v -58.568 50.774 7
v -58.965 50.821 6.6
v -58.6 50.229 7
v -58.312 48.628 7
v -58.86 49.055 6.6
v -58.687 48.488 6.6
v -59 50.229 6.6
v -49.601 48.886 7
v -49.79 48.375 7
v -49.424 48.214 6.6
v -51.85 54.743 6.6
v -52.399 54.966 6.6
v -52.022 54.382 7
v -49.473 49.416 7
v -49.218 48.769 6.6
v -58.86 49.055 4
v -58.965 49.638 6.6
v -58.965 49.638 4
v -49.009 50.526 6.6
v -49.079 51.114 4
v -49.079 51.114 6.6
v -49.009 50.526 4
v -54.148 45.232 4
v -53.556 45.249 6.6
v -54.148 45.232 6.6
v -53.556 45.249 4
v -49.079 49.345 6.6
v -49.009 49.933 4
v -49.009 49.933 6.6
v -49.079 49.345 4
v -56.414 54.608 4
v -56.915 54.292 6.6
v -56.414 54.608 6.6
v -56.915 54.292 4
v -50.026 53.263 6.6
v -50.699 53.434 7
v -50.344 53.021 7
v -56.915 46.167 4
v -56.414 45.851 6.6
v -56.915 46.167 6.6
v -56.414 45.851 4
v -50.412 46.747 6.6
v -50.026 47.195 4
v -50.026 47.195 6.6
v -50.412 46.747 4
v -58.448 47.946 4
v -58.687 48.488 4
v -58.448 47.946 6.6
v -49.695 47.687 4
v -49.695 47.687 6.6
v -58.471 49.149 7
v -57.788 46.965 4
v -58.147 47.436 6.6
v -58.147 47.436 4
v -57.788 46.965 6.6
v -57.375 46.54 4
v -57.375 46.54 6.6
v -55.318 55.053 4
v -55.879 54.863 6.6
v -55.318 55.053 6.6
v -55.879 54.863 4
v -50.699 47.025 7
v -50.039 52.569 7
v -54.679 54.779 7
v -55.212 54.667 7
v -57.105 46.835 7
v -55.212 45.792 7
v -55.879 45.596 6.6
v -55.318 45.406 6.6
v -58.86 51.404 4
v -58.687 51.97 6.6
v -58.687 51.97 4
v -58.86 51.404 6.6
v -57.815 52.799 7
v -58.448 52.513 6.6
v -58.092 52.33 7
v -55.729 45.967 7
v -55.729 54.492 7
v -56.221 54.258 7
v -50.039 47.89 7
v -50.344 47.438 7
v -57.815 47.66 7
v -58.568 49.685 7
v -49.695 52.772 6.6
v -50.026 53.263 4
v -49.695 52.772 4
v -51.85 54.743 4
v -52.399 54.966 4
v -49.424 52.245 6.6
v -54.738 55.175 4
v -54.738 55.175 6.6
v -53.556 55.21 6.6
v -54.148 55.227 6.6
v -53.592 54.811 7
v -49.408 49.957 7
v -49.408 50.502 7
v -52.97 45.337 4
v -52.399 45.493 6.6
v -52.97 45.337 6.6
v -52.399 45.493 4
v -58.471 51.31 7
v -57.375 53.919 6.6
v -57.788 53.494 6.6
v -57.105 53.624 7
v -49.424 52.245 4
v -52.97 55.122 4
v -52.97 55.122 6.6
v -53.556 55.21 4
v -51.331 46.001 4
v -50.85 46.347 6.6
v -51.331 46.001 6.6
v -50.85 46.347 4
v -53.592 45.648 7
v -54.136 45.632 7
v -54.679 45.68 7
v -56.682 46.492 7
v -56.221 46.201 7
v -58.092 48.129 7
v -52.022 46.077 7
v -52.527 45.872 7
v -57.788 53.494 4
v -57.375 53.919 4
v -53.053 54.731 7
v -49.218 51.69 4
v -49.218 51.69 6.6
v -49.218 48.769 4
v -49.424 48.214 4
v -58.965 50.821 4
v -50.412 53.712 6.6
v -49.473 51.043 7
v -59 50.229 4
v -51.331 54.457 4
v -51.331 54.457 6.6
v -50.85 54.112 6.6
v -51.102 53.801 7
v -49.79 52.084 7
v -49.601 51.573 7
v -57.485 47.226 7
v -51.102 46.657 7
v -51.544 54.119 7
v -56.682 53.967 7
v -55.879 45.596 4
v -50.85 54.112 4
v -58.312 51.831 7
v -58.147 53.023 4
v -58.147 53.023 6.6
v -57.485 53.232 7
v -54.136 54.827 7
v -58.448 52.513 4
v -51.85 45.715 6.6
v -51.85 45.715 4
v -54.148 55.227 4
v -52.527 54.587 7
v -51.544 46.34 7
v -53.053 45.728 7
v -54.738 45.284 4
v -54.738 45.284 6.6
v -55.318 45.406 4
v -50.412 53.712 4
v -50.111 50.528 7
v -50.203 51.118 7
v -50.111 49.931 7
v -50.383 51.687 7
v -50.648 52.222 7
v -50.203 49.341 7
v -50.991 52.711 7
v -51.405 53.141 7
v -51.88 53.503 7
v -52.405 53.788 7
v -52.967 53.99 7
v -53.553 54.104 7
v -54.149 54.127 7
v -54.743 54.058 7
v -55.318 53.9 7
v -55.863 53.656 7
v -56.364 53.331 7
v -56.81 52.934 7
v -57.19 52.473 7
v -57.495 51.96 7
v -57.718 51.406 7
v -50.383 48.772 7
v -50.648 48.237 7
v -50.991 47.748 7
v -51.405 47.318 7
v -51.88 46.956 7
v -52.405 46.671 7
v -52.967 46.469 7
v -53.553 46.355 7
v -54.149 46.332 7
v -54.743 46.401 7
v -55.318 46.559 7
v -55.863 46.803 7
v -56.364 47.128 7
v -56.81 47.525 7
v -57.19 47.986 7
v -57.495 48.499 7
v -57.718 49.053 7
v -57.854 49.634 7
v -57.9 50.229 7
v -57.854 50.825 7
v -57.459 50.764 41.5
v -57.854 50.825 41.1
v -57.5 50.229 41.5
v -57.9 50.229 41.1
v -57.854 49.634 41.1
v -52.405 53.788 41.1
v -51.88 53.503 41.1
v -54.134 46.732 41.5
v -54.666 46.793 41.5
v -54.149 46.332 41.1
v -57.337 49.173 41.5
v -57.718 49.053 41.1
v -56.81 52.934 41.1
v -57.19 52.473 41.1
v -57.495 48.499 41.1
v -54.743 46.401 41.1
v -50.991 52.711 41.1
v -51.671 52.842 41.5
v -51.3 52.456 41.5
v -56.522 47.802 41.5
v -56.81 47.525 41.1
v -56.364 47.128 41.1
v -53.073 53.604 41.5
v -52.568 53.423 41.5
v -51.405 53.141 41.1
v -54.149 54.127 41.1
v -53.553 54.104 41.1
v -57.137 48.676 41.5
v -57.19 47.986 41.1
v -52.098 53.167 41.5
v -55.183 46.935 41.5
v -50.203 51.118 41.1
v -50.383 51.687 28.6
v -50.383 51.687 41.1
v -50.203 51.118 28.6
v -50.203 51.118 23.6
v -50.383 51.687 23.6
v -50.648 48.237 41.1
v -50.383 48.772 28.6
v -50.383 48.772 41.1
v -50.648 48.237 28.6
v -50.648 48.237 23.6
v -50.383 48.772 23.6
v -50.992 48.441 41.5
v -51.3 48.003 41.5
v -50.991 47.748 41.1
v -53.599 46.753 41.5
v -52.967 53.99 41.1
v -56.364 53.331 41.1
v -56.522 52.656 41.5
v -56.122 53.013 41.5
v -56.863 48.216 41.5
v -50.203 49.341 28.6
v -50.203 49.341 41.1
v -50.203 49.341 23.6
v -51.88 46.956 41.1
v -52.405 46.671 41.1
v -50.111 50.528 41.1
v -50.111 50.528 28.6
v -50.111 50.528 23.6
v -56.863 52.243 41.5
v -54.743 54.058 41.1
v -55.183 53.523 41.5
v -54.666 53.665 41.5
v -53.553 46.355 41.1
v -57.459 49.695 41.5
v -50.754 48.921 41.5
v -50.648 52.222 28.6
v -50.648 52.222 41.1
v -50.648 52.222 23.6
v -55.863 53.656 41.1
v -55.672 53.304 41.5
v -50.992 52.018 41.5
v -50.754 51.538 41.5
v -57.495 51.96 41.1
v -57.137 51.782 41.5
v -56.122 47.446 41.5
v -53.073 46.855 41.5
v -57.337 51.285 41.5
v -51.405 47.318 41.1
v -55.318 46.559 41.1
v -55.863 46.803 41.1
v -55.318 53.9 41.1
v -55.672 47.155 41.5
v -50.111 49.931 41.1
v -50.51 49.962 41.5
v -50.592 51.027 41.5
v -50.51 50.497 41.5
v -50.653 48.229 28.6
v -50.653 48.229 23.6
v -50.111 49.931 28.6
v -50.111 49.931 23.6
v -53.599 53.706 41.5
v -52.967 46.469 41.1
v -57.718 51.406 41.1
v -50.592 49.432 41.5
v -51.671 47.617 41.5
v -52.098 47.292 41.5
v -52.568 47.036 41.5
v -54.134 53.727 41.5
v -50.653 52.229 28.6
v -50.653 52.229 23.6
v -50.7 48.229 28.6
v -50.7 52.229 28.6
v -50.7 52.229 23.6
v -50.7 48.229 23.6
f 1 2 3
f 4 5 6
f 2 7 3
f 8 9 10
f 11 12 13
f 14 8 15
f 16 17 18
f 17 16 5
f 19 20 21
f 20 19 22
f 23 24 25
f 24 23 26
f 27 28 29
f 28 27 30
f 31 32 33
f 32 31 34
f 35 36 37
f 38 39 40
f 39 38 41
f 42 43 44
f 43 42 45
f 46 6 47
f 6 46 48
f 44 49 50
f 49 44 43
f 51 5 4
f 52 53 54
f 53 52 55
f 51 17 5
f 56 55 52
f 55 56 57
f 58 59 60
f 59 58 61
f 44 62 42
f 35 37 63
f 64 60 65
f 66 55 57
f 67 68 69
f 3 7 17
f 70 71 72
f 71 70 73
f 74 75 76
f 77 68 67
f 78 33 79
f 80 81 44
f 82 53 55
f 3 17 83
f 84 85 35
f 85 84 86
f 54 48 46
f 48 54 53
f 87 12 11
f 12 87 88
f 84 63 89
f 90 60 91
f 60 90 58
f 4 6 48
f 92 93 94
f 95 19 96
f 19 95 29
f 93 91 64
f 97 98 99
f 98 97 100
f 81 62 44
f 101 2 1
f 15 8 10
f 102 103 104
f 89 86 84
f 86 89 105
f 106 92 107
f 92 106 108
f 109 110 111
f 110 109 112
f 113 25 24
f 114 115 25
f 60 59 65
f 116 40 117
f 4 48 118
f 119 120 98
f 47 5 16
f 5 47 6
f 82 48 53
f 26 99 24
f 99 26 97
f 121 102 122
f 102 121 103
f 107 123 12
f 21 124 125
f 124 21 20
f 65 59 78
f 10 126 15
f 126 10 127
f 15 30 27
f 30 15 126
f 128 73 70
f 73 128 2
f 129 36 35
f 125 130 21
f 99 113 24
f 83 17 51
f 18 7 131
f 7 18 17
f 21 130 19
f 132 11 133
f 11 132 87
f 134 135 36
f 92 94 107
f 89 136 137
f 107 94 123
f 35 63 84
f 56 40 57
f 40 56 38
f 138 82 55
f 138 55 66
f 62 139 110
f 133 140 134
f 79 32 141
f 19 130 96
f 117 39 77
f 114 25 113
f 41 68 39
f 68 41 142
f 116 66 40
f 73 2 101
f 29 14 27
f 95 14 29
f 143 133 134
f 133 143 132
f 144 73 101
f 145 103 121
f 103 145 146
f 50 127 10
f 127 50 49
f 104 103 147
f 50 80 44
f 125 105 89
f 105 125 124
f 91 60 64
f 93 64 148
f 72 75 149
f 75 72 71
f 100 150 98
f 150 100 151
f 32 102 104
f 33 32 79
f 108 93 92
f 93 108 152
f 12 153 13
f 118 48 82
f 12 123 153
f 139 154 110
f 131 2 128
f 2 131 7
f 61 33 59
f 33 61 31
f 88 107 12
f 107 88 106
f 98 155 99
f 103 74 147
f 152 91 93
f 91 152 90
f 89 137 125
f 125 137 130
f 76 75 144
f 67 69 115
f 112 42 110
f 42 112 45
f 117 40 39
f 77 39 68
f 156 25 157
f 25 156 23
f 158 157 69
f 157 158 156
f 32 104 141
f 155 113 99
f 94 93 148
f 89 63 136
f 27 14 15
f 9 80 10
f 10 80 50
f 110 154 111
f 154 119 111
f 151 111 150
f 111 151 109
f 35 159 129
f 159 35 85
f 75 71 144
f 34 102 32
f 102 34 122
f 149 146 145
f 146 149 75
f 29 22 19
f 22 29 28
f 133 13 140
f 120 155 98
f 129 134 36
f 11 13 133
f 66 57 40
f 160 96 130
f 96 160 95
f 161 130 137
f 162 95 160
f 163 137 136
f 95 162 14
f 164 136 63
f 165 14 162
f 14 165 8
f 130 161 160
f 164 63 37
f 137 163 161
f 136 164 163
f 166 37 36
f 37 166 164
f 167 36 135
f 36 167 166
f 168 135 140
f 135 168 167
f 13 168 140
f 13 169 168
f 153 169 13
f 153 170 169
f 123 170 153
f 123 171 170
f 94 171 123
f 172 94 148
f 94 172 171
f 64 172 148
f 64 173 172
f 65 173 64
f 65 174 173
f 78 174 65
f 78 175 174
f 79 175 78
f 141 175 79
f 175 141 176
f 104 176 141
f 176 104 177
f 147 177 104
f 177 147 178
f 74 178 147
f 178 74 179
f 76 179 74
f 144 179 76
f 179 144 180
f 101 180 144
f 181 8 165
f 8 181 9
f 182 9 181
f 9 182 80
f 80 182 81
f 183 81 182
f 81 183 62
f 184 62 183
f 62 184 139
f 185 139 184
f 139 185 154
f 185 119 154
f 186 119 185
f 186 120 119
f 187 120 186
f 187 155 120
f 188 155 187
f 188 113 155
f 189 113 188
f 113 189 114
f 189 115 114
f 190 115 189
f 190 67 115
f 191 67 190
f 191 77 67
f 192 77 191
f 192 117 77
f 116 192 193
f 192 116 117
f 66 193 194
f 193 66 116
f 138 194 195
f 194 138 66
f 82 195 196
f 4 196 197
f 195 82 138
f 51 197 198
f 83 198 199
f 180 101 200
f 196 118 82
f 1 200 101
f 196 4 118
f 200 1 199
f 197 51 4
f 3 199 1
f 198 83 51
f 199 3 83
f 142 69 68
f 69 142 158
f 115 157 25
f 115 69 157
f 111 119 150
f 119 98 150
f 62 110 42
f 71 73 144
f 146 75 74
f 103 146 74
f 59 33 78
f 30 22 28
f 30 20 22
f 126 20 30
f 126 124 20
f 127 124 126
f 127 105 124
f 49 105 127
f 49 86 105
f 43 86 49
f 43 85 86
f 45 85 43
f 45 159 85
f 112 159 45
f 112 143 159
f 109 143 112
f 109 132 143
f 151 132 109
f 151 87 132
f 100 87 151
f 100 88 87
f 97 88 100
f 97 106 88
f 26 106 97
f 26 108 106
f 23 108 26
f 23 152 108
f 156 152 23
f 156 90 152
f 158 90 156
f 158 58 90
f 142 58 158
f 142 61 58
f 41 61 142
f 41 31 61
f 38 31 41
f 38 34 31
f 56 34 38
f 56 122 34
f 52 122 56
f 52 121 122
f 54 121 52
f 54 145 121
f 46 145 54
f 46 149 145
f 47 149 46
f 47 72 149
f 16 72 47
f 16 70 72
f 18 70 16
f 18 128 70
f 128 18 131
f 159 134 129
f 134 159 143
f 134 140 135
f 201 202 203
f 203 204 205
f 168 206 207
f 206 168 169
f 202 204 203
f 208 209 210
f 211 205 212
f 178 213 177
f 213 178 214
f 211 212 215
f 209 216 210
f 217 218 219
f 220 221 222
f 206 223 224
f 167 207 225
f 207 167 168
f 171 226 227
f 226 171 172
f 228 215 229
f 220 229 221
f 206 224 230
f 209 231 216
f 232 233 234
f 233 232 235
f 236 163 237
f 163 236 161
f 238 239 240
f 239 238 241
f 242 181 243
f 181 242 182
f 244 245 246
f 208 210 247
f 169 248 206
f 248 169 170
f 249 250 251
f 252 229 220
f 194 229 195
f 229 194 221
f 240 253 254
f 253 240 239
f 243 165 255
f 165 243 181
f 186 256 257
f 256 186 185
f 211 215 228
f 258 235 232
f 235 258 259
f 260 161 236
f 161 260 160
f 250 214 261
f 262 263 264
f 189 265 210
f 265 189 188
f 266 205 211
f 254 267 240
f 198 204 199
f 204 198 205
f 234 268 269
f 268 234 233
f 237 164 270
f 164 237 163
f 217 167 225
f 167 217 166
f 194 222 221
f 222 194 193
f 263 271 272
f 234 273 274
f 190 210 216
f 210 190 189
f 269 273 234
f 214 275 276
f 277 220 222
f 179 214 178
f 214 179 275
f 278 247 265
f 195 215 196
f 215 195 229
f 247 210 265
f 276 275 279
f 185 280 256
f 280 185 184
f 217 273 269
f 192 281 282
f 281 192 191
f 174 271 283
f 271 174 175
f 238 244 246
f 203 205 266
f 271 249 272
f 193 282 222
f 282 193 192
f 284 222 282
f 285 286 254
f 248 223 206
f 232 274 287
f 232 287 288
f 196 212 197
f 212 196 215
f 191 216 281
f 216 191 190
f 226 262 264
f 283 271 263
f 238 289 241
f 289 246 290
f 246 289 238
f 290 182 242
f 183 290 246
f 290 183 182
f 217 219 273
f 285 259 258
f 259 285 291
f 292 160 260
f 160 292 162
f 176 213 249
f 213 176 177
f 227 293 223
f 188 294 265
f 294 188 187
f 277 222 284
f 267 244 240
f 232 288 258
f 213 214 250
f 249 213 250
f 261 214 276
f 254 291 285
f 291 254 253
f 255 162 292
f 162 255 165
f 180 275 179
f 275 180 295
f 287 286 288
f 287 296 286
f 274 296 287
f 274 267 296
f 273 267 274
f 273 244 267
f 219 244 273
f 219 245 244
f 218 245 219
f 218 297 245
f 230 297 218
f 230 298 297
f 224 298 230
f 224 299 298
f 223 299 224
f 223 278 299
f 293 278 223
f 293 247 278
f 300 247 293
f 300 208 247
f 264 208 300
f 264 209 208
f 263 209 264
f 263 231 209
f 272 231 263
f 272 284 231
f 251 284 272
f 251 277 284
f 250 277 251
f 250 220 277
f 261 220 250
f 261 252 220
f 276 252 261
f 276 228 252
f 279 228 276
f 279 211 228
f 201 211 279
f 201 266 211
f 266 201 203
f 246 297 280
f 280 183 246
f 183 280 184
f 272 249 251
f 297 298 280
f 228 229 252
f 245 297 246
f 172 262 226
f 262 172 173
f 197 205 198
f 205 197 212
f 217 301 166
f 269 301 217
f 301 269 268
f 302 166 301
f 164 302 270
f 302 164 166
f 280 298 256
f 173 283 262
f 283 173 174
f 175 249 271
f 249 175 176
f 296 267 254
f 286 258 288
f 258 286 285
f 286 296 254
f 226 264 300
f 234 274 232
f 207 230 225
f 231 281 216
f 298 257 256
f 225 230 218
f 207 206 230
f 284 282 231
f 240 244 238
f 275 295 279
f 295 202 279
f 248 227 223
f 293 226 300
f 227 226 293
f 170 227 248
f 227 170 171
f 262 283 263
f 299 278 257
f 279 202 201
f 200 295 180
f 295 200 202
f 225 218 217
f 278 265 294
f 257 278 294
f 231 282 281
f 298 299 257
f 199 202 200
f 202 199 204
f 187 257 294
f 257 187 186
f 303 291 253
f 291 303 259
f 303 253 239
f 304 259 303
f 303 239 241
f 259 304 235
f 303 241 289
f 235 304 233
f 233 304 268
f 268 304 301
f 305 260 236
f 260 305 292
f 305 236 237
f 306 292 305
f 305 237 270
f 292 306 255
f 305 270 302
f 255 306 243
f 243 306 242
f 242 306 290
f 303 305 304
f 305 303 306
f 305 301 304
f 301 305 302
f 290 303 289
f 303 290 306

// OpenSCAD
// file: ../drive_lib.scad
// ============================================================================
//  Вспомогательные модули модуля вращения (шкивы).
//  Подключать через use <../drive_lib.scad>.
// ============================================================================

include <drive_params.scad>
use <../lib/common.scad>

// Канавка под квадратный пассик: трапеция со дном чуть шире пассика и
// разведёнными стенками — пассик сам садится на дно.
module sq_belt_groove(od) {
    wb = belt_t + 0.2;
    wt = wb/2 + (pulley_groove_h + 0.5)*tan(30);
    rotate_extrude(angle = 360) polygon([
        [od/2 - pulley_groove_h, -wb/2],
        [od/2 - pulley_groove_h,  wb/2],
        [od/2 + 0.5,  wt],
        [od/2 + 0.5, -wt]]);
}

// Колесо без ступицы: обод с канавкой посередине, диск с окнами.
// web_top — диск у верхнего края обода (иначе у нижнего).
module pulley_wheel(od, web_top = false) {
    rim_id = od - 2*pulley_rim_w;
    win_r  = (rim_id/2 + pulley_hub_d/2)/2;
    win_d  = rim_id/2 - pulley_hub_d/2 - 5;
    difference() {
        union() {
            tube(od, rim_id, pulley_t);
            translate([0, 0, web_top ? pulley_t - pulley_web_t : 0])
                cylinder(d = rim_id + 1, h = pulley_web_t);
        }
        translate([0, 0, pulley_t/2]) sq_belt_groove(od);
        if (win_d > 6)
            translate([0, 0, web_top ? pulley_t - pulley_web_t : 0])
                radial_holes(5, win_r, win_d, pulley_web_t);
    }
}

// Отверстие под стопорный винт M3 в ступице, на высоте z от её низа
module set_screw_hole(z) translate([0, 0, z]) rotate([0, 90, 0])
    cylinder(d = scr3_pilot, h = pulley_hub_d);

// Лыска под стопорный винт на печатном валу. z, az — в координатах сборки
// относительно оси вала (z абсолютный).
module shaft_flat(z, az = 0)
    rotate([0, 0, az])
        translate([rod_print_d/2 - rod_flat_d, -rod_flat_w/2, z - rod_flat_len/2])
            cube([rod_flat_d + 2, rod_flat_w, rod_flat_len]);

// Тело печатного вала на оси [0,0]: буртик-упор снизу, опциональный
// кончик под отверстие пластинки. z — абсолютные координаты сборки.
module printed_shaft_body(top_z, tip_len = 0) {
    body_h = top_z - rod_bottom_z - tip_len;
    translate([0, 0, rod_bottom_z]) {
        chamfered_cyl(stop_ring_d, rod_bottom_gap, ch = 0.4, bottom = false);
        chamfered_cyl(rod_print_d, body_h, ch = 0.4, bottom = false,
                      top = tip_len <= 0);
        if (tip_len > 0)
            translate([0, 0, body_h])
                chamfered_cyl(spindle_tip_d, tip_len, ch = 0.4, bottom = false);
    }
}
// file: ../../lib/common.scad
// ============================================================================
//  Вспомогательные модули общего назначения.
//  Подключать через use <lib/common.scad> — файл не содержит параметров
//  проекта и ни от чего не зависит.
// ============================================================================

_eps = 0.01;

// --------------------------------------------------------------------- 2D ---
// Прямоугольник со скруглёнными углами, по центру
module rrect(w, d, r) {
    rr = min(r, w/2 - _eps, d/2 - _eps);
    if (rr > 0) offset(r = rr) square([w - 2*rr, d - 2*rr], center = true);
    else square([w, d], center = true);
}

// --------------------------------------------------------------------- 3D ---
// Коробка со скруглением ТОЛЬКО вертикальных рёбер: нижние и верхние острые
module rounded_box(w, d, h, r) linear_extrude(height = h) rrect(w, d, r);

// Цилиндр с фасками на торцах (снимает «слоновью ногу» и облегчает посадку)
module chamfered_cyl(d, h, ch = 0.6, bottom = true, top = true) {
    r  = d/2;
    cb = bottom ? min(ch, h/2) : 0;
    ct = top    ? min(ch, h/2) : 0;
    if (cb <= 0 && ct <= 0) cylinder(d = d, h = h);
    else rotate_extrude(angle = 360) polygon(concat(
        [[0, 0]],
        cb > 0 ? [[r - cb, 0], [r, cb]] : [[r, 0]],
        ct > 0 ? [[r, h - ct], [r - ct, h]] : [[r, h]],
        [[0, h]]));
}

// Труба
module tube(od, id, h) difference() {
    cylinder(d = od, h = h);
    translate([0, 0, -_eps]) cylinder(d = id, h = h + 2*_eps);
}

// Сквозное отверстие, растянутое вверх-вниз для гарантированного вычитания
module thru(d, h) translate([0, 0, -_eps]) cylinder(d = d, h = h + 2*_eps);

// Потайное отверстие под саморез с конической головкой.
// Пластина занимает z = [0 .. t], головка утапливается сверху,
// саморез идёт вниз (в ответную стойку).
module countersunk_hole(free_d, head_d, t, down = 30) {
    cone_h = (head_d - free_d)/2;    // головка 90 градусов
    union() {
        translate([0, 0, -down]) cylinder(d = free_d, h = down + t - cone_h + _eps);
        translate([0, 0, t - cone_h]) cylinder(d1 = free_d, d2 = head_d, h = cone_h);
    }
}

// Паз (щелевое отверстие) длиной len по X, сквозной по высоте h
module slot(len, d, h) hull() for (s = [-1, 1])
    translate([s*(len - d)/2, 0, 0]) cylinder(d = d, h = h);

// Стойка под саморез: цилиндр с пилотным отверстием сверху.
// Снизу фаски нет — стойка растёт из дна детали.
module screw_boss(od, h, pilot_d, pilot_depth, ch = 0.6) difference() {
    chamfered_cyl(od, h, ch = ch, bottom = false, top = true);
    translate([0, 0, h - pilot_depth]) cylinder(d = pilot_d, h = pilot_depth + _eps);
}

// Треугольная косынка в плоскости XZ (катеты l по X и h по Z), толщина t по Y
module gusset(l, h, t) translate([0, -t/2, 0]) linear_extrude(height = t)
    polygon([[0, 0], [l, 0], [0, h]]);

// Конусное гнездо под заточенный винт-ось (ось Z вниз от z=0)
module cone_seat(d, depth) translate([0, 0, -depth])
    cylinder(d1 = 0.2, d2 = d, h = depth + _eps);

// Канавка под круглый пассик: тор, вычитаемый из обода
module belt_groove(pulley_d, groove_r) rotate_extrude(angle = 360)
    translate([pulley_d/2, 0]) circle(r = groove_r);

// Сетка облегчающих отверстий по кругу
module radial_holes(n, r, d, h) for (i = [0 : n - 1])
    rotate([0, 0, i*360/n]) translate([r, 0, 0]) thru(d, h);
// main file
// ============================================================================
//  ПРОМВАЛ — печатный, вместо стального прутка 8 мм
//
//  Тот же диаметр, что у вала диска: посадка в два 608ZZ и сам участок
//  под пассик 2 (шкив второй ступени). Снизу буртик-упор, сверху на вал
//  напрессовывается колпачок drive_idler_cap. Лыска — под стопорный винт
//  большого колеса.
//
//  Печать: стоя, буртиком на стол, 100% заполнение. Участок под пассиком
//  лучше слегка зашкурить для сцепления.
// ============================================================================

include <../drive_params.scad>
use <../../lib/common.scad>
use <../drive_lib.scad>

module drive_idler_shaft() {
    translate([idler_pos[0], idler_pos[1], 0]) difference() {
        printed_shaft_body(idler_rod_top_z);
        shaft_flat(idler_set_z);
    }
}

drive_idler_shaft();
